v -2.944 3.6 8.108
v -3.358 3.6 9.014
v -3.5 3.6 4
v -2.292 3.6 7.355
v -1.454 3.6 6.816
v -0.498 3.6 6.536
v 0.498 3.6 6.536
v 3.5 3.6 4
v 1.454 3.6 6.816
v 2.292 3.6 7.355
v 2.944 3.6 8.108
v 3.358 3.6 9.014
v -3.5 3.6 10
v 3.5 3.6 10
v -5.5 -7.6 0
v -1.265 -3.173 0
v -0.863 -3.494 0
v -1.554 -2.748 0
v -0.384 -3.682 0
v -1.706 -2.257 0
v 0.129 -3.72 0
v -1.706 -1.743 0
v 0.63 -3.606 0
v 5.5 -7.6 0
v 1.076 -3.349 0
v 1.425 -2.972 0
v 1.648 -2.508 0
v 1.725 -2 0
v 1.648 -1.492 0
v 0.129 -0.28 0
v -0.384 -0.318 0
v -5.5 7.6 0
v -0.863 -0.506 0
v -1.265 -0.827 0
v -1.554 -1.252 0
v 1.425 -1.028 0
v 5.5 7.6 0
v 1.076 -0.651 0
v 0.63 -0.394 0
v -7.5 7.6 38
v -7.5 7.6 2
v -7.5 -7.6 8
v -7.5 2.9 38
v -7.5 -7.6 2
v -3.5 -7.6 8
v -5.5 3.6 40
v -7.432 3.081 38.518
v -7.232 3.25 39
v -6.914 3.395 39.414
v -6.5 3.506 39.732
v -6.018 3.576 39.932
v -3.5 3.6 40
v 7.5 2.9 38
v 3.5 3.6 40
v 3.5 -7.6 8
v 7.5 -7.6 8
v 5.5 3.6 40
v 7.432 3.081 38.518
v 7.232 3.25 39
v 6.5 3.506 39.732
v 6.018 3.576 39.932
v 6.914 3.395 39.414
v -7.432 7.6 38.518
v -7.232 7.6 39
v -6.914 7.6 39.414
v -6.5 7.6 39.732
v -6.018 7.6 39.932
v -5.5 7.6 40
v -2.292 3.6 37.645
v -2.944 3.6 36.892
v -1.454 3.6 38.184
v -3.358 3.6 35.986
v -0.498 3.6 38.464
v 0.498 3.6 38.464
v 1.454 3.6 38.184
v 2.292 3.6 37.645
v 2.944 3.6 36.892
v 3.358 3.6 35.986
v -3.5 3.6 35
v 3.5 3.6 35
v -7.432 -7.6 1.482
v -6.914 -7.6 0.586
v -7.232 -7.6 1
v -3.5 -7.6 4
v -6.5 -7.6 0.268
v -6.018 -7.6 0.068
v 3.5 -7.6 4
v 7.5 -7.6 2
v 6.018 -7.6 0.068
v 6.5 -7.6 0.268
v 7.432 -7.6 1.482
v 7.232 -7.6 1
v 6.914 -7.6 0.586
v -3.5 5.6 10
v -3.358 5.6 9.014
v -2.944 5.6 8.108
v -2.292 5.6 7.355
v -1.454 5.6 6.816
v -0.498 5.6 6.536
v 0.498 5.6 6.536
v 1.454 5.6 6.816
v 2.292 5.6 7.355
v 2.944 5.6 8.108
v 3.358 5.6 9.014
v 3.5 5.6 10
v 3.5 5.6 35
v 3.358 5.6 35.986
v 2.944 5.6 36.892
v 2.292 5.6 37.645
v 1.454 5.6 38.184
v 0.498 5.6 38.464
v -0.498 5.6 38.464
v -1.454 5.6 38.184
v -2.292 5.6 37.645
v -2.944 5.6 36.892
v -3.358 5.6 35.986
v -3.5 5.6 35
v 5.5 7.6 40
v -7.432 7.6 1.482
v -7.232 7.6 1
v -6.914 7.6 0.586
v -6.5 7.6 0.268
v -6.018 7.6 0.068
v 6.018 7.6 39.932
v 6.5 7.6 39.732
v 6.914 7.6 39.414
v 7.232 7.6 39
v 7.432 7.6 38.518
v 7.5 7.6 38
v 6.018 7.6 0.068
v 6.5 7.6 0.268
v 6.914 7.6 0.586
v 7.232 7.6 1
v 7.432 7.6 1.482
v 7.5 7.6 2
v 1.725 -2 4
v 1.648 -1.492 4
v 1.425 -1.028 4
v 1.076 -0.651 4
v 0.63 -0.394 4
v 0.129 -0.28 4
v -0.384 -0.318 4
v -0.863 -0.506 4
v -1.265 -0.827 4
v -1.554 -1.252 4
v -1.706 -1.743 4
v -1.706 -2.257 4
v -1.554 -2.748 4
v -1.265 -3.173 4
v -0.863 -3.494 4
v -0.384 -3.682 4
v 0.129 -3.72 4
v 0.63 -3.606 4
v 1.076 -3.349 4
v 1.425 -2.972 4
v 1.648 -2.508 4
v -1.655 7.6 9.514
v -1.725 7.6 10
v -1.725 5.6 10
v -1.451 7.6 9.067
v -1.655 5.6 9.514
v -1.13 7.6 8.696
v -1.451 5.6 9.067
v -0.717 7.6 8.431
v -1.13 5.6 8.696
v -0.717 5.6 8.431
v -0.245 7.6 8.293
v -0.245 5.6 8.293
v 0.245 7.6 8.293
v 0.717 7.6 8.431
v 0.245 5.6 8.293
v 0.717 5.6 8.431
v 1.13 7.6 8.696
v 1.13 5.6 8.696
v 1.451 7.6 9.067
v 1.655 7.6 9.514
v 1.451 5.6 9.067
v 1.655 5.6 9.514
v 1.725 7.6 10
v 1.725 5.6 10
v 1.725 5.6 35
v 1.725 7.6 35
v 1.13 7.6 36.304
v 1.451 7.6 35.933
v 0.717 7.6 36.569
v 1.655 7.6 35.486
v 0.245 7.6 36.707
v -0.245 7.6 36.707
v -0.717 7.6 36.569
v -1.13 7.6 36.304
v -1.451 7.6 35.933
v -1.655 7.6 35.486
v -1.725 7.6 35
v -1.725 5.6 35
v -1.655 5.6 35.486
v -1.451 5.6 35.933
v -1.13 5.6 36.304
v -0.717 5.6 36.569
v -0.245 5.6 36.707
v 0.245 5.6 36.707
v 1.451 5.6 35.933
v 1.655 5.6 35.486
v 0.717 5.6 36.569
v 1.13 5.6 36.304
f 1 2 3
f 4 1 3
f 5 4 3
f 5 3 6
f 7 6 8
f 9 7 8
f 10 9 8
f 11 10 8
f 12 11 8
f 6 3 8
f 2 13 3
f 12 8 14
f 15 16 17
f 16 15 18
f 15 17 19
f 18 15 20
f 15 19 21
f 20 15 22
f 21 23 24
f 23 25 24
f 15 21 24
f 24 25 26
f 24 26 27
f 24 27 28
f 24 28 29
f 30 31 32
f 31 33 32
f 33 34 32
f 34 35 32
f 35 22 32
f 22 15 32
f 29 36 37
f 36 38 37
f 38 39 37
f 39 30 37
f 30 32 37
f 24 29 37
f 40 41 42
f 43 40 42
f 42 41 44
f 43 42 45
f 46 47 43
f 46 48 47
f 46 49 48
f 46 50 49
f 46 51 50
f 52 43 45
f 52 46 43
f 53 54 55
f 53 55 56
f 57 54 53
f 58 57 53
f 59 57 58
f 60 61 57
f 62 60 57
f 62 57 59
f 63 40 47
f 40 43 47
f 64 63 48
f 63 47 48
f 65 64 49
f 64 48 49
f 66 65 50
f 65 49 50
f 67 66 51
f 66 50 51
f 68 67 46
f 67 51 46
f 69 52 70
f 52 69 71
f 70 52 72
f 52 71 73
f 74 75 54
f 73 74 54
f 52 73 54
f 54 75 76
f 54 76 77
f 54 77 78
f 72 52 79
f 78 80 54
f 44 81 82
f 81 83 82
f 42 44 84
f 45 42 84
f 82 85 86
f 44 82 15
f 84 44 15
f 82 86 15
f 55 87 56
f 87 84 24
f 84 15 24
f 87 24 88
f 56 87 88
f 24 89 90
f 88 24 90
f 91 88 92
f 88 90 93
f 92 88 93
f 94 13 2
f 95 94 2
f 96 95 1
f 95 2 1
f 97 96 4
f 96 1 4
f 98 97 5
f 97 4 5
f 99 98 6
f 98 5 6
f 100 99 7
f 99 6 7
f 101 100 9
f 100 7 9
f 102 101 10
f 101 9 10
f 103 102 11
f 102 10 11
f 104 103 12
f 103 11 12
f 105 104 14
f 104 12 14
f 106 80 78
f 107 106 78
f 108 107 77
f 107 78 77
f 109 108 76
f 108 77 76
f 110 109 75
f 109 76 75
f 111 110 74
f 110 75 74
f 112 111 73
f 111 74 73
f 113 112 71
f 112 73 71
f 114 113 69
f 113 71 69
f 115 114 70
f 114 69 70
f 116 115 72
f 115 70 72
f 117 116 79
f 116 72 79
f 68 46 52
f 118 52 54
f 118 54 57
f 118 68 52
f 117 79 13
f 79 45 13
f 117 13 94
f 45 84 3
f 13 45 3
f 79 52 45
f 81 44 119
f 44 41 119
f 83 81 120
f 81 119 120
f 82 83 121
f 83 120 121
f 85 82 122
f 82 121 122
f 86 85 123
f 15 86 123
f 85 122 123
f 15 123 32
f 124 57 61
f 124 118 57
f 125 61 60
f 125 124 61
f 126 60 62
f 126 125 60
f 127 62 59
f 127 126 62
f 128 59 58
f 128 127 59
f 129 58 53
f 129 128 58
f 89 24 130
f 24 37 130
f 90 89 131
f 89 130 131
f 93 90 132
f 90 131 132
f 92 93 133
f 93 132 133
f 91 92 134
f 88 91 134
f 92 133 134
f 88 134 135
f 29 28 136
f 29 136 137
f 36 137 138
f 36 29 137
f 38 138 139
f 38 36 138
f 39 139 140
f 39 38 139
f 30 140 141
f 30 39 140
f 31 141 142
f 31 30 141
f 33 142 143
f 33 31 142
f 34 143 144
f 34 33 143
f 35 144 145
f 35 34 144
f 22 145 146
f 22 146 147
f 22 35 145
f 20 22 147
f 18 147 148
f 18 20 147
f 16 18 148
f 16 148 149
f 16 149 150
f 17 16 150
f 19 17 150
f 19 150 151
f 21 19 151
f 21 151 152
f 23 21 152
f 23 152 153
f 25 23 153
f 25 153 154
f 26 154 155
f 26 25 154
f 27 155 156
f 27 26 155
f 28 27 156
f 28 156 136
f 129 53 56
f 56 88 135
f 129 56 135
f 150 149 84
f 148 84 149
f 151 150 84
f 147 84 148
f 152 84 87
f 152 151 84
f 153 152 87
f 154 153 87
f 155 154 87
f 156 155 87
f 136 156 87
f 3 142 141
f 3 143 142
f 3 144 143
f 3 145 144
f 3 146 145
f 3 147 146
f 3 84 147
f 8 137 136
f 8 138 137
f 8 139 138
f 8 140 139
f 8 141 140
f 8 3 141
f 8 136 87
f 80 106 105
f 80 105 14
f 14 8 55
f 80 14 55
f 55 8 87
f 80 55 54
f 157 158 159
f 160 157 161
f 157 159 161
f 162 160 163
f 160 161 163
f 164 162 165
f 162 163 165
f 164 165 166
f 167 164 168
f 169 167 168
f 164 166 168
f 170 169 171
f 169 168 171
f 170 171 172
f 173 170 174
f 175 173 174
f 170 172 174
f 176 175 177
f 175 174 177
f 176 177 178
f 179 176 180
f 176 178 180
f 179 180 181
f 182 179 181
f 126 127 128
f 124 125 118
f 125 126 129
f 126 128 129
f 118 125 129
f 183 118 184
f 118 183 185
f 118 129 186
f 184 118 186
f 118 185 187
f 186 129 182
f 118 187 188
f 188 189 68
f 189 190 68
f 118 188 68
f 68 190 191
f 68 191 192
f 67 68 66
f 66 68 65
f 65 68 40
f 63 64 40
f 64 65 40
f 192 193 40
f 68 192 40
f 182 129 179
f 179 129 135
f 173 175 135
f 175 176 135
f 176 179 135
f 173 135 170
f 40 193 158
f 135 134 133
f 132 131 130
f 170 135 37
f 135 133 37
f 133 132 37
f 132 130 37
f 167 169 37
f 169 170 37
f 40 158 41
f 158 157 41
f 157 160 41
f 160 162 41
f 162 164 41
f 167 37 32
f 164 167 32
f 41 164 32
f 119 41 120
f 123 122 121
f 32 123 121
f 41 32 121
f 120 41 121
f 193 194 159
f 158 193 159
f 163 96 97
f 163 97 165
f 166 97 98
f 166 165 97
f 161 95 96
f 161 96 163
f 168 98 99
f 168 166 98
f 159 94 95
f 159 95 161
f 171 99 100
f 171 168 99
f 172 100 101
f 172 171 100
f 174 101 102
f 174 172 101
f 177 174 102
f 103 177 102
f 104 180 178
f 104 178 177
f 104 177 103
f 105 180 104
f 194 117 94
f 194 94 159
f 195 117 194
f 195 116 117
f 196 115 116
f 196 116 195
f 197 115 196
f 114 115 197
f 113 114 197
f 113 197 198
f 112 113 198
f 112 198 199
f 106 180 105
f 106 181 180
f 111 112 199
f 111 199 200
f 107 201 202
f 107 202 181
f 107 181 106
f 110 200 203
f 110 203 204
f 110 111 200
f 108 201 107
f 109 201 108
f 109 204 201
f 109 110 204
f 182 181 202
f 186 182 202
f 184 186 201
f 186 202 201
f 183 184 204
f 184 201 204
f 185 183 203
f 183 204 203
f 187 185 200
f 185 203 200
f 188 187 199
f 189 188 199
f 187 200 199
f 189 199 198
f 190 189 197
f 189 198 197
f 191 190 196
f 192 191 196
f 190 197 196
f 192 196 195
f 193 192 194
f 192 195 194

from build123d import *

# Parameters (mm, degrees)
F0_W     = 15
F0_H     = 15.2
F0_R     = 1.725
F1_DEPTH = 4
F3_DEPTH = 36
F5_DEPTH = 2
F6_DEPTH = 4
F7_SIZE2 = 11.2
F7_SIZE  = 32
F8_R     = 2


with BuildPart() as f1:
    # F0 (on Top) → F1 (new body)
    with BuildSketch(Plane.XY):
        Rectangle(F0_W, F0_H)
        with Locations((0, -2)):
            Circle(F0_R, mode=Mode.SUBTRACT)
    extrude(amount=F1_DEPTH)

    # F2 (on face) → F3 (join)
    with BuildSketch(Plane.XY.offset(4)):
        Polygon((-7.5, 7.6), (-7.5, -7.6), (-3.5, -7.6), (-3.5, -2), (-3.5, 3.6), (3.5, 3.6), (3.5, -2), (3.5, -7.6), (7.5, -7.6), (7.5, 7.6), align=None)
    extrude(amount=F3_DEPTH)

    # F4 (on face) → F5 (cut)
    with BuildSketch(Plane.XZ.offset(-3.6)):
        with BuildLine():
            Line((-1.725, 13.045385854), (-1.725, 31.954614146))
            ThreePointArc((-1.725, 31.954614146), (-3.0238634228, 33.2375443268), (-3.5, 35))
            Line((-3.5, 35), (-3.5, 10))
            ThreePointArc((-3.5, 10), (-3.0238634228, 11.7624556732), (-1.725, 13.045385854))
        make_face()
        with BuildLine():
            ThreePointArc((3.5, 35), (3.0238634228, 33.2375443268), (1.725, 31.954614146))
            Line((1.725, 31.954614146), (1.725, 13.045385854))
            ThreePointArc((1.725, 13.045385854), (3.0238634228, 11.7624556732), (3.5, 10))
            Line((3.5, 10), (3.5, 35))
        make_face()
        with BuildLine():
            ThreePointArc((-1.725, 35), (0, 36.725), (1.725, 35))
            Line((1.725, 35), (1.725, 31.954614146))
            ThreePointArc((1.725, 31.954614146), (3.0238634228, 33.2375443268), (3.5, 35))
            ThreePointArc((3.5, 35), (0, 38.5), (-3.5, 35))
            ThreePointArc((-3.5, 35), (-3.0238634228, 33.2375443268), (-1.725, 31.954614146))
            Line((-1.725, 31.954614146), (-1.725, 35))
        make_face()
        with BuildLine():
            ThreePointArc((3.5, 10), (3.0238634228, 11.7624556732), (1.725, 13.045385854))
            Line((1.725, 13.045385854), (1.725, 10))
            ThreePointArc((1.725, 10), (0, 8.275), (-1.725, 10))
            Line((-1.725, 10), (-1.725, 13.045385854))
            ThreePointArc((-1.725, 13.045385854), (-3.0238634228, 11.7624556732), (-3.5, 10))
            ThreePointArc((-3.5, 10), (0, 6.5), (3.5, 10))
        make_face()
    extrude(amount=-F5_DEPTH, mode=Mode.SUBTRACT)

    # F4 (on face) → F6 (cut, through all)
    with BuildSketch(Plane.XZ.offset(-3.6)):
        with BuildLine():
            ThreePointArc((-1.725, 35), (0, 33.275), (1.725, 35))
            ThreePointArc((1.725, 35), (0, 36.725), (-1.725, 35))
        make_face()
        with BuildLine():
            Line((1.725, 31.954614146), (1.725, 35))
            ThreePointArc((1.725, 35), (0, 33.275), (-1.725, 35))
            Line((-1.725, 35), (-1.725, 31.954614146))
            ThreePointArc((-1.725, 31.954614146), (0, 31.5), (1.725, 31.954614146))
        make_face()
        with BuildLine():
            Line((1.725, 13.045385854), (1.725, 31.954614146))
            ThreePointArc((1.725, 31.954614146), (0, 31.5), (-1.725, 31.954614146))
            Line((-1.725, 31.954614146), (-1.725, 13.045385854))
            ThreePointArc((-1.725, 13.045385854), (0, 13.5), (1.725, 13.045385854))
        make_face()
        with BuildLine():
            Line((1.725, 10), (1.725, 13.045385854))
            ThreePointArc((1.725, 13.045385854), (0, 13.5), (-1.725, 13.045385854))
            Line((-1.725, 13.045385854), (-1.725, 10))
            ThreePointArc((-1.725, 10), (0, 11.725), (1.725, 10))
        make_face()
        with BuildLine():
            ThreePointArc((-1.725, 10), (0, 8.275), (1.725, 10))
            ThreePointArc((1.725, 10), (0, 11.725), (-1.725, 10))
        make_face()
    extrude(amount=-F6_DEPTH, mode=Mode.SUBTRACT)

    # F7
    f7_edges = [f1.edges().sort_by_distance(p)[0] for p in [
        (5.5, -7.6, 40),
        (-5.5, -7.6, 40),
    ]]
    f7_side = f1.faces().sort_by_distance((-7.0728, -7.6, 20))[0]
    chamfer(f7_edges, length=F7_SIZE, length2=F7_SIZE2, reference=f7_side)

    # F8
    f8_edges = [f1.edges().sort_by_distance(p)[0] for p in [
        (-7.5, 5.6, 40),
        (7.5, 5.6, 40),
        (-7.5, 0, 0),
        (7.5, 0, 0),
    ]]
    fillet(f8_edges, radius=F8_R)


solid = f1.part
